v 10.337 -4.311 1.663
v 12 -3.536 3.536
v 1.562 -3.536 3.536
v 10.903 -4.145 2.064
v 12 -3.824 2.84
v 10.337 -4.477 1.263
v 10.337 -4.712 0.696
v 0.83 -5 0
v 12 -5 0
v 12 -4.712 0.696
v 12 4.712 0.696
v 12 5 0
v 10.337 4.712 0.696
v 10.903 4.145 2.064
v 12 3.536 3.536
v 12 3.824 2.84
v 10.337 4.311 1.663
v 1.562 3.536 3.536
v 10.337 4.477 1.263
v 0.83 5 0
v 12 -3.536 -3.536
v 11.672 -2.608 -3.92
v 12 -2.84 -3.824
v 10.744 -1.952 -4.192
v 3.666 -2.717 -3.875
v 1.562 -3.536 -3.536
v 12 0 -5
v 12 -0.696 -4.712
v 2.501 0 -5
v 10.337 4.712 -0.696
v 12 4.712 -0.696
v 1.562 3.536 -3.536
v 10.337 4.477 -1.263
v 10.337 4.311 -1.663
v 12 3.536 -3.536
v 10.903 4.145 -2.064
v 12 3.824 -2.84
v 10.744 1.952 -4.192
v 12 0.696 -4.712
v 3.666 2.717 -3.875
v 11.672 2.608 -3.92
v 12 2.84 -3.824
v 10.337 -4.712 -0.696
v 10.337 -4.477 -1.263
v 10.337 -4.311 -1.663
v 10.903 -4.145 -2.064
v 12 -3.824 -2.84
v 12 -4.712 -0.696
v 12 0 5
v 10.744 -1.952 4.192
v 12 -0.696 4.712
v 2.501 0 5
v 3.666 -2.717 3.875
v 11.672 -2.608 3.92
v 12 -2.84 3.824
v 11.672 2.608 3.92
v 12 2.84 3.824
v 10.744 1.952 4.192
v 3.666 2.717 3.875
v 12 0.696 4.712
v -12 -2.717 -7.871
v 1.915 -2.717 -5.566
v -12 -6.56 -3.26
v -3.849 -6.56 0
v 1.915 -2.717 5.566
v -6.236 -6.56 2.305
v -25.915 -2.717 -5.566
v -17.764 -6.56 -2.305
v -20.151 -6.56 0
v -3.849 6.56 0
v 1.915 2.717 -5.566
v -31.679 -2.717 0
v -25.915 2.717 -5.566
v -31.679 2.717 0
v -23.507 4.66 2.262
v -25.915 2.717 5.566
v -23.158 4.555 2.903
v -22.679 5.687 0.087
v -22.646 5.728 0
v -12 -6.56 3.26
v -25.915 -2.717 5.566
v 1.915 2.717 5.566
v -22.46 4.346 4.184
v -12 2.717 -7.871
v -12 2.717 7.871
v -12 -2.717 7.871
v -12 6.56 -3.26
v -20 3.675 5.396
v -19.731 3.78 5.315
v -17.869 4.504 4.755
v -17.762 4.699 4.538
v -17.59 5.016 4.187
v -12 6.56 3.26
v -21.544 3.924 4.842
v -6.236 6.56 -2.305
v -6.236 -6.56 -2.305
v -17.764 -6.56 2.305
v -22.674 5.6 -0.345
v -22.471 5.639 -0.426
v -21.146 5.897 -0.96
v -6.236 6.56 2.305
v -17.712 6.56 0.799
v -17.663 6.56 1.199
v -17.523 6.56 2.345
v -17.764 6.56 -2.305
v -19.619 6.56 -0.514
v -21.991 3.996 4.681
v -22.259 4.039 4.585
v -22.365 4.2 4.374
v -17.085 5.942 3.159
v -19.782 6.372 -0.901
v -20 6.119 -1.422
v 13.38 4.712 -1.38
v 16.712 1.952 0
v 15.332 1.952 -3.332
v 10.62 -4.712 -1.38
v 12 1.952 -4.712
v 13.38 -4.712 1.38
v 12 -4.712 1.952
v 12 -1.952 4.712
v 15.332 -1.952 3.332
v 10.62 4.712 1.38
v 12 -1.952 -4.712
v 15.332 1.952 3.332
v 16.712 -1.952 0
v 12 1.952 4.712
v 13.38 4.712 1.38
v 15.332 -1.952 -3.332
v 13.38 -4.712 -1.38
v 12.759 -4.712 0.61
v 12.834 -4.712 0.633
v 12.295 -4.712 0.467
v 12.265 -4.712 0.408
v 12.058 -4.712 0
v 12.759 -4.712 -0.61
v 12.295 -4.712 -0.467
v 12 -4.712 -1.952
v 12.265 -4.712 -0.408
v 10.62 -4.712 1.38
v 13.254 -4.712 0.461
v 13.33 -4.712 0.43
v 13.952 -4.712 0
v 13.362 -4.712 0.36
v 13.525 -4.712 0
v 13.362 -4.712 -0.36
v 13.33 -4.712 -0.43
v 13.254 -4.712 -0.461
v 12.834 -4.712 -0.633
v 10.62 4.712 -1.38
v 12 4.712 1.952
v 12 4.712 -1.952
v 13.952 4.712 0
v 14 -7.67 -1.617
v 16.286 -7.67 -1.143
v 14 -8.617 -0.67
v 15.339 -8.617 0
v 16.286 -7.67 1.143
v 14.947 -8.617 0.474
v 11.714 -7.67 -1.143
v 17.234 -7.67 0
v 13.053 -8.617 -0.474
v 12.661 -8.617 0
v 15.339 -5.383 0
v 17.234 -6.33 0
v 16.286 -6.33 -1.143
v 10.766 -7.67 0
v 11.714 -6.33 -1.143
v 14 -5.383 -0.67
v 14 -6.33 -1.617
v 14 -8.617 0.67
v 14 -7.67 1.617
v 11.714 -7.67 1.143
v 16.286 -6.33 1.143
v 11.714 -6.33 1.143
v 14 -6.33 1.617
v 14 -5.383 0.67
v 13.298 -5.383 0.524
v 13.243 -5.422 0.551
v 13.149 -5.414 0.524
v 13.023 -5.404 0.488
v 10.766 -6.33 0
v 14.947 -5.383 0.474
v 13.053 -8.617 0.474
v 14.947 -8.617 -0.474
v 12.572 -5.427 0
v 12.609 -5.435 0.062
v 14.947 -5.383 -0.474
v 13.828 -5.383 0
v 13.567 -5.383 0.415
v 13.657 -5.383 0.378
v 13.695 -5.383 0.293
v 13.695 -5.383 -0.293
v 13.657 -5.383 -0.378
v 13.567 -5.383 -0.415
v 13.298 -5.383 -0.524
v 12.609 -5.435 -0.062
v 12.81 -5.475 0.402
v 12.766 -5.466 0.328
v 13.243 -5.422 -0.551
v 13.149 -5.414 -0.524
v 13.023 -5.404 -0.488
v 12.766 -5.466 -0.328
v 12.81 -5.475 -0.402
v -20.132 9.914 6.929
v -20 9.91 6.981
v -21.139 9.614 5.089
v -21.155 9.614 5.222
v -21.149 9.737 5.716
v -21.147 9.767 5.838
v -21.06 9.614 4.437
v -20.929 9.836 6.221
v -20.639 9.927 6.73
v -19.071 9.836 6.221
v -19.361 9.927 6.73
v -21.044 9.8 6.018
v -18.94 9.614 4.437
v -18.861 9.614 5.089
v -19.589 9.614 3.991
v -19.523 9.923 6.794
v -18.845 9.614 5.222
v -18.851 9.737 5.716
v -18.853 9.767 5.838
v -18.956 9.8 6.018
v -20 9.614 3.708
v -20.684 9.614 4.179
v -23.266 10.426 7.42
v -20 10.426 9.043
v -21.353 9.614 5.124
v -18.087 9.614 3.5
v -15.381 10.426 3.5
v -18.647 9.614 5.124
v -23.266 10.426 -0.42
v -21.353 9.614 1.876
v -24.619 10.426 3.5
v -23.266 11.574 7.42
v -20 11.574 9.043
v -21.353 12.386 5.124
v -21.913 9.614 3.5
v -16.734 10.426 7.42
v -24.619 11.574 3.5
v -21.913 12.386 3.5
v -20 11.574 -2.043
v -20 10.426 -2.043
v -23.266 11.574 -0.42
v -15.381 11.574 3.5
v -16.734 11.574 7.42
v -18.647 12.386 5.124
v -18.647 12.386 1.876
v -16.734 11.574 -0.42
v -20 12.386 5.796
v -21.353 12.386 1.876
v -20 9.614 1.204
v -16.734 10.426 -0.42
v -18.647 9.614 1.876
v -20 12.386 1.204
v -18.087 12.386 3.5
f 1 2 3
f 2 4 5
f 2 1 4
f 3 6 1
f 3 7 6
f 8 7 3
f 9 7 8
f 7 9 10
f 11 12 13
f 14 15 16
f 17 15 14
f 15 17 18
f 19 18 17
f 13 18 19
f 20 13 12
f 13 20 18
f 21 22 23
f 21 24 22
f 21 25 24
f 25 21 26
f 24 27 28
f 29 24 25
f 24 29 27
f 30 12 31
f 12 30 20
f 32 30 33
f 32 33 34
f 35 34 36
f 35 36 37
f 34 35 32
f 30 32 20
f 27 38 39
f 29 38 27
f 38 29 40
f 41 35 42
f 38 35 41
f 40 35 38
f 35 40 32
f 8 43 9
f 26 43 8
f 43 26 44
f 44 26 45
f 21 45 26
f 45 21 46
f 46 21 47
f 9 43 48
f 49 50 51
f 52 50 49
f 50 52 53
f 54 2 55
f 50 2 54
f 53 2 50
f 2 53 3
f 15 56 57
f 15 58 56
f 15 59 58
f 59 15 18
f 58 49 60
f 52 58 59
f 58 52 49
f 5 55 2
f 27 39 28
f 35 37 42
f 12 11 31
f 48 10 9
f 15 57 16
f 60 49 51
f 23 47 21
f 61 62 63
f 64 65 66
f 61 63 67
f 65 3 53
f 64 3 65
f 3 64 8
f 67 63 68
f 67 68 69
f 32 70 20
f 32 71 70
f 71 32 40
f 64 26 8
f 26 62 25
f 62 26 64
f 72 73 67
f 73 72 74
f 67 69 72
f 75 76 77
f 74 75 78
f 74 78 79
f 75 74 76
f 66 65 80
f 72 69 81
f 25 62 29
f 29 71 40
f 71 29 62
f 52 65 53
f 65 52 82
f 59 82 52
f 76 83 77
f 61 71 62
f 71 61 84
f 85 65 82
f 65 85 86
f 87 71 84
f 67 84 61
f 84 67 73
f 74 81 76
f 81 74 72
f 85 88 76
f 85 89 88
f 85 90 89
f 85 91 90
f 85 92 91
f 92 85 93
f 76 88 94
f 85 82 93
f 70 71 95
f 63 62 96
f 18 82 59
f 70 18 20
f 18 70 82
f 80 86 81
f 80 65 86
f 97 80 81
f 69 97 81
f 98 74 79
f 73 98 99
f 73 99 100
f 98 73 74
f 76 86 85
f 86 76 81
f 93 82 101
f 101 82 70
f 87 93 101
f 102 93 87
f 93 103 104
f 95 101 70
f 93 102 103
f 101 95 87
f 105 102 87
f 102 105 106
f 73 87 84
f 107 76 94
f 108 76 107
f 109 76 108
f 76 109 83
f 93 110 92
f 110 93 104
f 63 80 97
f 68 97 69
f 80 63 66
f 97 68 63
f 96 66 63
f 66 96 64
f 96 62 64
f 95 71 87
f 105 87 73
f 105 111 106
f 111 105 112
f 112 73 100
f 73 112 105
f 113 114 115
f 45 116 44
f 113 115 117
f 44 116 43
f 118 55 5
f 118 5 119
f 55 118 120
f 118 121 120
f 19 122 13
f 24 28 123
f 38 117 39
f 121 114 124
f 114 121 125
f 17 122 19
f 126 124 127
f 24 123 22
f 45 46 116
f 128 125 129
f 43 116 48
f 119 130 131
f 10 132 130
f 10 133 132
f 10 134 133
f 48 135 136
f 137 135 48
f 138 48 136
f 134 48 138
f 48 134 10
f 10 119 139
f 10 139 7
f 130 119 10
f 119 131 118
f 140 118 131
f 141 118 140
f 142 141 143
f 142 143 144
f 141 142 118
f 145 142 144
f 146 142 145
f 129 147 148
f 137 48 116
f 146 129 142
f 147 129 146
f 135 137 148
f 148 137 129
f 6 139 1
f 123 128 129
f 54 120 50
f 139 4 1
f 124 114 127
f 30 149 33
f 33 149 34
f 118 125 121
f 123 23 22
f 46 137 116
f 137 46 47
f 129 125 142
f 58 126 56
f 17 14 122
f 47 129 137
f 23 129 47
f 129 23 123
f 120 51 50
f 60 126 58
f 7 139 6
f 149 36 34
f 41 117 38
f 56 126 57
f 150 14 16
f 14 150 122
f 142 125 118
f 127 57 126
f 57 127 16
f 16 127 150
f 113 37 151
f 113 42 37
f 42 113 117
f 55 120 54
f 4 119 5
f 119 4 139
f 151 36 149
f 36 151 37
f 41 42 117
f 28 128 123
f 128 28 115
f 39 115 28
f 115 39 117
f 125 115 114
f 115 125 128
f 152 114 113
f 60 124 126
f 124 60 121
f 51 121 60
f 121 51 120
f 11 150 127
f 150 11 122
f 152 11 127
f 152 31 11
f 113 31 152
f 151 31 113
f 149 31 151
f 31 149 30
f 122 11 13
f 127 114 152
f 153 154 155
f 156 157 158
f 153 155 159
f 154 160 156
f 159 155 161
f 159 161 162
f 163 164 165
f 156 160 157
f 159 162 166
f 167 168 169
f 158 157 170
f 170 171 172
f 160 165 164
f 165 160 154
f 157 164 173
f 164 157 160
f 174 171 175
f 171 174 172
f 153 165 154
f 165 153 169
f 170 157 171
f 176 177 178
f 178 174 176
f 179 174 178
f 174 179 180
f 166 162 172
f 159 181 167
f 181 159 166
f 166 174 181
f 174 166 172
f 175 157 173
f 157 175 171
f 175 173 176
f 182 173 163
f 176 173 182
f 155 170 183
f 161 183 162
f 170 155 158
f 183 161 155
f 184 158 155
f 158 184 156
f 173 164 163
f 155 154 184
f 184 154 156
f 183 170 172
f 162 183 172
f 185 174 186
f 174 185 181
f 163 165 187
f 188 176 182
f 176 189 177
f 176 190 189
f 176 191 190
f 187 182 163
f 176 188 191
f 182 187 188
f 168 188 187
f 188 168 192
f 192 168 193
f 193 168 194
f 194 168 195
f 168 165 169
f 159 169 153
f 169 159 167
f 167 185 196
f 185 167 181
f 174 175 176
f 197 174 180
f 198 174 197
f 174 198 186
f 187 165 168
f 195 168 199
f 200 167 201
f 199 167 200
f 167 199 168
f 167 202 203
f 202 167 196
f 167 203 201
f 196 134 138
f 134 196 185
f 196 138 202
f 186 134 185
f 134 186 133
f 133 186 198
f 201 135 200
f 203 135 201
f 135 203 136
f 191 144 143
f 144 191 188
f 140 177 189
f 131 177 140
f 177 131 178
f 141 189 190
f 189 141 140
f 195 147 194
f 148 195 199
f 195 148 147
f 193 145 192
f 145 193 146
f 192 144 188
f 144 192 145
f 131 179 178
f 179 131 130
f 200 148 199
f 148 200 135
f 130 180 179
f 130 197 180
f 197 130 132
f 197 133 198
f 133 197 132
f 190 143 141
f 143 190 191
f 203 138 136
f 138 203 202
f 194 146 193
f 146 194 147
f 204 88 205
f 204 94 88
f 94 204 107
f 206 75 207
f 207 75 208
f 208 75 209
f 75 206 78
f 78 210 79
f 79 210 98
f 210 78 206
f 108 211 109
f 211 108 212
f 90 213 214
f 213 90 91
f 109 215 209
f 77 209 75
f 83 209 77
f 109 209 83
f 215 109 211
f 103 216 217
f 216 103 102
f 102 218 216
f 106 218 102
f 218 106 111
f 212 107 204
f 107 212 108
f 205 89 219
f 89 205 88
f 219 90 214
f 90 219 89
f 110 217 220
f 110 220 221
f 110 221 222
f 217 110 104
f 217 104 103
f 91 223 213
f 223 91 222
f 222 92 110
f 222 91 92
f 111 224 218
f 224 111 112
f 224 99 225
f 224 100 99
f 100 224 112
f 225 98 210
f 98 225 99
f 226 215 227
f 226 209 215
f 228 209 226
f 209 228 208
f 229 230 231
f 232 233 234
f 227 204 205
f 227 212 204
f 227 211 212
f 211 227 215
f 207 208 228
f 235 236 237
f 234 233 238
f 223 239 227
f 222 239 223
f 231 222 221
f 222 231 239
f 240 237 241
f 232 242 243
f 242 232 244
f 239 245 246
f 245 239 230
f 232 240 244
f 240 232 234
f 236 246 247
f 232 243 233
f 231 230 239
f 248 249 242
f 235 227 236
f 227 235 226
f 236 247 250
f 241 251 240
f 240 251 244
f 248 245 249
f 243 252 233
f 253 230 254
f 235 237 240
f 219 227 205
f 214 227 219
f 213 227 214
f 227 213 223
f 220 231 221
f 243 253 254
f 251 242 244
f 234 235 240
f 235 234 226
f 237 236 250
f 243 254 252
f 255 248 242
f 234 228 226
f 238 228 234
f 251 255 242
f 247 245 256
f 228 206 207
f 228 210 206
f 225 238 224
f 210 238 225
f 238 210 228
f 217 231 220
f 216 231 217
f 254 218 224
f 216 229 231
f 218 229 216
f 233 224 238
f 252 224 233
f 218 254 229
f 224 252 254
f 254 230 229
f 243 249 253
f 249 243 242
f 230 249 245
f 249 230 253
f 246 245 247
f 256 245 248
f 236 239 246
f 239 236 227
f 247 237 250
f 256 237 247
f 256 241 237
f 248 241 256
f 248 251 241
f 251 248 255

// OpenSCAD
module little_pod()
{
	scale(v = [1, 0.5, 0.5])
		sphere(r = 3.5);
}

module main_tank()
{
		union() {
			rotate(a = 90, v = [0, 1, 0])
				cylinder(h = 24, r1 = 5, r2 = 5, center = true);
			translate(v = [12, 0, 0])
				scale(v = [3, 1.2, 1])
				sphere(r = 7.1);
			translate(v = [-12, 0, 0])
				sphere(r = 5.1);
			translate(v = [-14, 0, 7])
				little_pod();
			translate(v = [-13, 0, 5])
				rotate(a = -30, v = [0, 1, 0])
					cylinder(h = 8, r1 = 1, r2 = 0.2, center = true);
			translate(v = [20, -2.5, -5])
				rotate(a = -35, v = [1, 0, 0])
					cylinder(h = 14, r1 = 0.7, r2 = 6, center = true);
			translate(v = [20, -3.5, -11])
				scale(v = [1, 1.2, 0.3])
					sphere(r = 5);
		}
}


$fn = 8;

rotate(a = 180, v = [0, 1, 0])
rotate(a = 90, v = [1, 0, 0])
main_tank();
